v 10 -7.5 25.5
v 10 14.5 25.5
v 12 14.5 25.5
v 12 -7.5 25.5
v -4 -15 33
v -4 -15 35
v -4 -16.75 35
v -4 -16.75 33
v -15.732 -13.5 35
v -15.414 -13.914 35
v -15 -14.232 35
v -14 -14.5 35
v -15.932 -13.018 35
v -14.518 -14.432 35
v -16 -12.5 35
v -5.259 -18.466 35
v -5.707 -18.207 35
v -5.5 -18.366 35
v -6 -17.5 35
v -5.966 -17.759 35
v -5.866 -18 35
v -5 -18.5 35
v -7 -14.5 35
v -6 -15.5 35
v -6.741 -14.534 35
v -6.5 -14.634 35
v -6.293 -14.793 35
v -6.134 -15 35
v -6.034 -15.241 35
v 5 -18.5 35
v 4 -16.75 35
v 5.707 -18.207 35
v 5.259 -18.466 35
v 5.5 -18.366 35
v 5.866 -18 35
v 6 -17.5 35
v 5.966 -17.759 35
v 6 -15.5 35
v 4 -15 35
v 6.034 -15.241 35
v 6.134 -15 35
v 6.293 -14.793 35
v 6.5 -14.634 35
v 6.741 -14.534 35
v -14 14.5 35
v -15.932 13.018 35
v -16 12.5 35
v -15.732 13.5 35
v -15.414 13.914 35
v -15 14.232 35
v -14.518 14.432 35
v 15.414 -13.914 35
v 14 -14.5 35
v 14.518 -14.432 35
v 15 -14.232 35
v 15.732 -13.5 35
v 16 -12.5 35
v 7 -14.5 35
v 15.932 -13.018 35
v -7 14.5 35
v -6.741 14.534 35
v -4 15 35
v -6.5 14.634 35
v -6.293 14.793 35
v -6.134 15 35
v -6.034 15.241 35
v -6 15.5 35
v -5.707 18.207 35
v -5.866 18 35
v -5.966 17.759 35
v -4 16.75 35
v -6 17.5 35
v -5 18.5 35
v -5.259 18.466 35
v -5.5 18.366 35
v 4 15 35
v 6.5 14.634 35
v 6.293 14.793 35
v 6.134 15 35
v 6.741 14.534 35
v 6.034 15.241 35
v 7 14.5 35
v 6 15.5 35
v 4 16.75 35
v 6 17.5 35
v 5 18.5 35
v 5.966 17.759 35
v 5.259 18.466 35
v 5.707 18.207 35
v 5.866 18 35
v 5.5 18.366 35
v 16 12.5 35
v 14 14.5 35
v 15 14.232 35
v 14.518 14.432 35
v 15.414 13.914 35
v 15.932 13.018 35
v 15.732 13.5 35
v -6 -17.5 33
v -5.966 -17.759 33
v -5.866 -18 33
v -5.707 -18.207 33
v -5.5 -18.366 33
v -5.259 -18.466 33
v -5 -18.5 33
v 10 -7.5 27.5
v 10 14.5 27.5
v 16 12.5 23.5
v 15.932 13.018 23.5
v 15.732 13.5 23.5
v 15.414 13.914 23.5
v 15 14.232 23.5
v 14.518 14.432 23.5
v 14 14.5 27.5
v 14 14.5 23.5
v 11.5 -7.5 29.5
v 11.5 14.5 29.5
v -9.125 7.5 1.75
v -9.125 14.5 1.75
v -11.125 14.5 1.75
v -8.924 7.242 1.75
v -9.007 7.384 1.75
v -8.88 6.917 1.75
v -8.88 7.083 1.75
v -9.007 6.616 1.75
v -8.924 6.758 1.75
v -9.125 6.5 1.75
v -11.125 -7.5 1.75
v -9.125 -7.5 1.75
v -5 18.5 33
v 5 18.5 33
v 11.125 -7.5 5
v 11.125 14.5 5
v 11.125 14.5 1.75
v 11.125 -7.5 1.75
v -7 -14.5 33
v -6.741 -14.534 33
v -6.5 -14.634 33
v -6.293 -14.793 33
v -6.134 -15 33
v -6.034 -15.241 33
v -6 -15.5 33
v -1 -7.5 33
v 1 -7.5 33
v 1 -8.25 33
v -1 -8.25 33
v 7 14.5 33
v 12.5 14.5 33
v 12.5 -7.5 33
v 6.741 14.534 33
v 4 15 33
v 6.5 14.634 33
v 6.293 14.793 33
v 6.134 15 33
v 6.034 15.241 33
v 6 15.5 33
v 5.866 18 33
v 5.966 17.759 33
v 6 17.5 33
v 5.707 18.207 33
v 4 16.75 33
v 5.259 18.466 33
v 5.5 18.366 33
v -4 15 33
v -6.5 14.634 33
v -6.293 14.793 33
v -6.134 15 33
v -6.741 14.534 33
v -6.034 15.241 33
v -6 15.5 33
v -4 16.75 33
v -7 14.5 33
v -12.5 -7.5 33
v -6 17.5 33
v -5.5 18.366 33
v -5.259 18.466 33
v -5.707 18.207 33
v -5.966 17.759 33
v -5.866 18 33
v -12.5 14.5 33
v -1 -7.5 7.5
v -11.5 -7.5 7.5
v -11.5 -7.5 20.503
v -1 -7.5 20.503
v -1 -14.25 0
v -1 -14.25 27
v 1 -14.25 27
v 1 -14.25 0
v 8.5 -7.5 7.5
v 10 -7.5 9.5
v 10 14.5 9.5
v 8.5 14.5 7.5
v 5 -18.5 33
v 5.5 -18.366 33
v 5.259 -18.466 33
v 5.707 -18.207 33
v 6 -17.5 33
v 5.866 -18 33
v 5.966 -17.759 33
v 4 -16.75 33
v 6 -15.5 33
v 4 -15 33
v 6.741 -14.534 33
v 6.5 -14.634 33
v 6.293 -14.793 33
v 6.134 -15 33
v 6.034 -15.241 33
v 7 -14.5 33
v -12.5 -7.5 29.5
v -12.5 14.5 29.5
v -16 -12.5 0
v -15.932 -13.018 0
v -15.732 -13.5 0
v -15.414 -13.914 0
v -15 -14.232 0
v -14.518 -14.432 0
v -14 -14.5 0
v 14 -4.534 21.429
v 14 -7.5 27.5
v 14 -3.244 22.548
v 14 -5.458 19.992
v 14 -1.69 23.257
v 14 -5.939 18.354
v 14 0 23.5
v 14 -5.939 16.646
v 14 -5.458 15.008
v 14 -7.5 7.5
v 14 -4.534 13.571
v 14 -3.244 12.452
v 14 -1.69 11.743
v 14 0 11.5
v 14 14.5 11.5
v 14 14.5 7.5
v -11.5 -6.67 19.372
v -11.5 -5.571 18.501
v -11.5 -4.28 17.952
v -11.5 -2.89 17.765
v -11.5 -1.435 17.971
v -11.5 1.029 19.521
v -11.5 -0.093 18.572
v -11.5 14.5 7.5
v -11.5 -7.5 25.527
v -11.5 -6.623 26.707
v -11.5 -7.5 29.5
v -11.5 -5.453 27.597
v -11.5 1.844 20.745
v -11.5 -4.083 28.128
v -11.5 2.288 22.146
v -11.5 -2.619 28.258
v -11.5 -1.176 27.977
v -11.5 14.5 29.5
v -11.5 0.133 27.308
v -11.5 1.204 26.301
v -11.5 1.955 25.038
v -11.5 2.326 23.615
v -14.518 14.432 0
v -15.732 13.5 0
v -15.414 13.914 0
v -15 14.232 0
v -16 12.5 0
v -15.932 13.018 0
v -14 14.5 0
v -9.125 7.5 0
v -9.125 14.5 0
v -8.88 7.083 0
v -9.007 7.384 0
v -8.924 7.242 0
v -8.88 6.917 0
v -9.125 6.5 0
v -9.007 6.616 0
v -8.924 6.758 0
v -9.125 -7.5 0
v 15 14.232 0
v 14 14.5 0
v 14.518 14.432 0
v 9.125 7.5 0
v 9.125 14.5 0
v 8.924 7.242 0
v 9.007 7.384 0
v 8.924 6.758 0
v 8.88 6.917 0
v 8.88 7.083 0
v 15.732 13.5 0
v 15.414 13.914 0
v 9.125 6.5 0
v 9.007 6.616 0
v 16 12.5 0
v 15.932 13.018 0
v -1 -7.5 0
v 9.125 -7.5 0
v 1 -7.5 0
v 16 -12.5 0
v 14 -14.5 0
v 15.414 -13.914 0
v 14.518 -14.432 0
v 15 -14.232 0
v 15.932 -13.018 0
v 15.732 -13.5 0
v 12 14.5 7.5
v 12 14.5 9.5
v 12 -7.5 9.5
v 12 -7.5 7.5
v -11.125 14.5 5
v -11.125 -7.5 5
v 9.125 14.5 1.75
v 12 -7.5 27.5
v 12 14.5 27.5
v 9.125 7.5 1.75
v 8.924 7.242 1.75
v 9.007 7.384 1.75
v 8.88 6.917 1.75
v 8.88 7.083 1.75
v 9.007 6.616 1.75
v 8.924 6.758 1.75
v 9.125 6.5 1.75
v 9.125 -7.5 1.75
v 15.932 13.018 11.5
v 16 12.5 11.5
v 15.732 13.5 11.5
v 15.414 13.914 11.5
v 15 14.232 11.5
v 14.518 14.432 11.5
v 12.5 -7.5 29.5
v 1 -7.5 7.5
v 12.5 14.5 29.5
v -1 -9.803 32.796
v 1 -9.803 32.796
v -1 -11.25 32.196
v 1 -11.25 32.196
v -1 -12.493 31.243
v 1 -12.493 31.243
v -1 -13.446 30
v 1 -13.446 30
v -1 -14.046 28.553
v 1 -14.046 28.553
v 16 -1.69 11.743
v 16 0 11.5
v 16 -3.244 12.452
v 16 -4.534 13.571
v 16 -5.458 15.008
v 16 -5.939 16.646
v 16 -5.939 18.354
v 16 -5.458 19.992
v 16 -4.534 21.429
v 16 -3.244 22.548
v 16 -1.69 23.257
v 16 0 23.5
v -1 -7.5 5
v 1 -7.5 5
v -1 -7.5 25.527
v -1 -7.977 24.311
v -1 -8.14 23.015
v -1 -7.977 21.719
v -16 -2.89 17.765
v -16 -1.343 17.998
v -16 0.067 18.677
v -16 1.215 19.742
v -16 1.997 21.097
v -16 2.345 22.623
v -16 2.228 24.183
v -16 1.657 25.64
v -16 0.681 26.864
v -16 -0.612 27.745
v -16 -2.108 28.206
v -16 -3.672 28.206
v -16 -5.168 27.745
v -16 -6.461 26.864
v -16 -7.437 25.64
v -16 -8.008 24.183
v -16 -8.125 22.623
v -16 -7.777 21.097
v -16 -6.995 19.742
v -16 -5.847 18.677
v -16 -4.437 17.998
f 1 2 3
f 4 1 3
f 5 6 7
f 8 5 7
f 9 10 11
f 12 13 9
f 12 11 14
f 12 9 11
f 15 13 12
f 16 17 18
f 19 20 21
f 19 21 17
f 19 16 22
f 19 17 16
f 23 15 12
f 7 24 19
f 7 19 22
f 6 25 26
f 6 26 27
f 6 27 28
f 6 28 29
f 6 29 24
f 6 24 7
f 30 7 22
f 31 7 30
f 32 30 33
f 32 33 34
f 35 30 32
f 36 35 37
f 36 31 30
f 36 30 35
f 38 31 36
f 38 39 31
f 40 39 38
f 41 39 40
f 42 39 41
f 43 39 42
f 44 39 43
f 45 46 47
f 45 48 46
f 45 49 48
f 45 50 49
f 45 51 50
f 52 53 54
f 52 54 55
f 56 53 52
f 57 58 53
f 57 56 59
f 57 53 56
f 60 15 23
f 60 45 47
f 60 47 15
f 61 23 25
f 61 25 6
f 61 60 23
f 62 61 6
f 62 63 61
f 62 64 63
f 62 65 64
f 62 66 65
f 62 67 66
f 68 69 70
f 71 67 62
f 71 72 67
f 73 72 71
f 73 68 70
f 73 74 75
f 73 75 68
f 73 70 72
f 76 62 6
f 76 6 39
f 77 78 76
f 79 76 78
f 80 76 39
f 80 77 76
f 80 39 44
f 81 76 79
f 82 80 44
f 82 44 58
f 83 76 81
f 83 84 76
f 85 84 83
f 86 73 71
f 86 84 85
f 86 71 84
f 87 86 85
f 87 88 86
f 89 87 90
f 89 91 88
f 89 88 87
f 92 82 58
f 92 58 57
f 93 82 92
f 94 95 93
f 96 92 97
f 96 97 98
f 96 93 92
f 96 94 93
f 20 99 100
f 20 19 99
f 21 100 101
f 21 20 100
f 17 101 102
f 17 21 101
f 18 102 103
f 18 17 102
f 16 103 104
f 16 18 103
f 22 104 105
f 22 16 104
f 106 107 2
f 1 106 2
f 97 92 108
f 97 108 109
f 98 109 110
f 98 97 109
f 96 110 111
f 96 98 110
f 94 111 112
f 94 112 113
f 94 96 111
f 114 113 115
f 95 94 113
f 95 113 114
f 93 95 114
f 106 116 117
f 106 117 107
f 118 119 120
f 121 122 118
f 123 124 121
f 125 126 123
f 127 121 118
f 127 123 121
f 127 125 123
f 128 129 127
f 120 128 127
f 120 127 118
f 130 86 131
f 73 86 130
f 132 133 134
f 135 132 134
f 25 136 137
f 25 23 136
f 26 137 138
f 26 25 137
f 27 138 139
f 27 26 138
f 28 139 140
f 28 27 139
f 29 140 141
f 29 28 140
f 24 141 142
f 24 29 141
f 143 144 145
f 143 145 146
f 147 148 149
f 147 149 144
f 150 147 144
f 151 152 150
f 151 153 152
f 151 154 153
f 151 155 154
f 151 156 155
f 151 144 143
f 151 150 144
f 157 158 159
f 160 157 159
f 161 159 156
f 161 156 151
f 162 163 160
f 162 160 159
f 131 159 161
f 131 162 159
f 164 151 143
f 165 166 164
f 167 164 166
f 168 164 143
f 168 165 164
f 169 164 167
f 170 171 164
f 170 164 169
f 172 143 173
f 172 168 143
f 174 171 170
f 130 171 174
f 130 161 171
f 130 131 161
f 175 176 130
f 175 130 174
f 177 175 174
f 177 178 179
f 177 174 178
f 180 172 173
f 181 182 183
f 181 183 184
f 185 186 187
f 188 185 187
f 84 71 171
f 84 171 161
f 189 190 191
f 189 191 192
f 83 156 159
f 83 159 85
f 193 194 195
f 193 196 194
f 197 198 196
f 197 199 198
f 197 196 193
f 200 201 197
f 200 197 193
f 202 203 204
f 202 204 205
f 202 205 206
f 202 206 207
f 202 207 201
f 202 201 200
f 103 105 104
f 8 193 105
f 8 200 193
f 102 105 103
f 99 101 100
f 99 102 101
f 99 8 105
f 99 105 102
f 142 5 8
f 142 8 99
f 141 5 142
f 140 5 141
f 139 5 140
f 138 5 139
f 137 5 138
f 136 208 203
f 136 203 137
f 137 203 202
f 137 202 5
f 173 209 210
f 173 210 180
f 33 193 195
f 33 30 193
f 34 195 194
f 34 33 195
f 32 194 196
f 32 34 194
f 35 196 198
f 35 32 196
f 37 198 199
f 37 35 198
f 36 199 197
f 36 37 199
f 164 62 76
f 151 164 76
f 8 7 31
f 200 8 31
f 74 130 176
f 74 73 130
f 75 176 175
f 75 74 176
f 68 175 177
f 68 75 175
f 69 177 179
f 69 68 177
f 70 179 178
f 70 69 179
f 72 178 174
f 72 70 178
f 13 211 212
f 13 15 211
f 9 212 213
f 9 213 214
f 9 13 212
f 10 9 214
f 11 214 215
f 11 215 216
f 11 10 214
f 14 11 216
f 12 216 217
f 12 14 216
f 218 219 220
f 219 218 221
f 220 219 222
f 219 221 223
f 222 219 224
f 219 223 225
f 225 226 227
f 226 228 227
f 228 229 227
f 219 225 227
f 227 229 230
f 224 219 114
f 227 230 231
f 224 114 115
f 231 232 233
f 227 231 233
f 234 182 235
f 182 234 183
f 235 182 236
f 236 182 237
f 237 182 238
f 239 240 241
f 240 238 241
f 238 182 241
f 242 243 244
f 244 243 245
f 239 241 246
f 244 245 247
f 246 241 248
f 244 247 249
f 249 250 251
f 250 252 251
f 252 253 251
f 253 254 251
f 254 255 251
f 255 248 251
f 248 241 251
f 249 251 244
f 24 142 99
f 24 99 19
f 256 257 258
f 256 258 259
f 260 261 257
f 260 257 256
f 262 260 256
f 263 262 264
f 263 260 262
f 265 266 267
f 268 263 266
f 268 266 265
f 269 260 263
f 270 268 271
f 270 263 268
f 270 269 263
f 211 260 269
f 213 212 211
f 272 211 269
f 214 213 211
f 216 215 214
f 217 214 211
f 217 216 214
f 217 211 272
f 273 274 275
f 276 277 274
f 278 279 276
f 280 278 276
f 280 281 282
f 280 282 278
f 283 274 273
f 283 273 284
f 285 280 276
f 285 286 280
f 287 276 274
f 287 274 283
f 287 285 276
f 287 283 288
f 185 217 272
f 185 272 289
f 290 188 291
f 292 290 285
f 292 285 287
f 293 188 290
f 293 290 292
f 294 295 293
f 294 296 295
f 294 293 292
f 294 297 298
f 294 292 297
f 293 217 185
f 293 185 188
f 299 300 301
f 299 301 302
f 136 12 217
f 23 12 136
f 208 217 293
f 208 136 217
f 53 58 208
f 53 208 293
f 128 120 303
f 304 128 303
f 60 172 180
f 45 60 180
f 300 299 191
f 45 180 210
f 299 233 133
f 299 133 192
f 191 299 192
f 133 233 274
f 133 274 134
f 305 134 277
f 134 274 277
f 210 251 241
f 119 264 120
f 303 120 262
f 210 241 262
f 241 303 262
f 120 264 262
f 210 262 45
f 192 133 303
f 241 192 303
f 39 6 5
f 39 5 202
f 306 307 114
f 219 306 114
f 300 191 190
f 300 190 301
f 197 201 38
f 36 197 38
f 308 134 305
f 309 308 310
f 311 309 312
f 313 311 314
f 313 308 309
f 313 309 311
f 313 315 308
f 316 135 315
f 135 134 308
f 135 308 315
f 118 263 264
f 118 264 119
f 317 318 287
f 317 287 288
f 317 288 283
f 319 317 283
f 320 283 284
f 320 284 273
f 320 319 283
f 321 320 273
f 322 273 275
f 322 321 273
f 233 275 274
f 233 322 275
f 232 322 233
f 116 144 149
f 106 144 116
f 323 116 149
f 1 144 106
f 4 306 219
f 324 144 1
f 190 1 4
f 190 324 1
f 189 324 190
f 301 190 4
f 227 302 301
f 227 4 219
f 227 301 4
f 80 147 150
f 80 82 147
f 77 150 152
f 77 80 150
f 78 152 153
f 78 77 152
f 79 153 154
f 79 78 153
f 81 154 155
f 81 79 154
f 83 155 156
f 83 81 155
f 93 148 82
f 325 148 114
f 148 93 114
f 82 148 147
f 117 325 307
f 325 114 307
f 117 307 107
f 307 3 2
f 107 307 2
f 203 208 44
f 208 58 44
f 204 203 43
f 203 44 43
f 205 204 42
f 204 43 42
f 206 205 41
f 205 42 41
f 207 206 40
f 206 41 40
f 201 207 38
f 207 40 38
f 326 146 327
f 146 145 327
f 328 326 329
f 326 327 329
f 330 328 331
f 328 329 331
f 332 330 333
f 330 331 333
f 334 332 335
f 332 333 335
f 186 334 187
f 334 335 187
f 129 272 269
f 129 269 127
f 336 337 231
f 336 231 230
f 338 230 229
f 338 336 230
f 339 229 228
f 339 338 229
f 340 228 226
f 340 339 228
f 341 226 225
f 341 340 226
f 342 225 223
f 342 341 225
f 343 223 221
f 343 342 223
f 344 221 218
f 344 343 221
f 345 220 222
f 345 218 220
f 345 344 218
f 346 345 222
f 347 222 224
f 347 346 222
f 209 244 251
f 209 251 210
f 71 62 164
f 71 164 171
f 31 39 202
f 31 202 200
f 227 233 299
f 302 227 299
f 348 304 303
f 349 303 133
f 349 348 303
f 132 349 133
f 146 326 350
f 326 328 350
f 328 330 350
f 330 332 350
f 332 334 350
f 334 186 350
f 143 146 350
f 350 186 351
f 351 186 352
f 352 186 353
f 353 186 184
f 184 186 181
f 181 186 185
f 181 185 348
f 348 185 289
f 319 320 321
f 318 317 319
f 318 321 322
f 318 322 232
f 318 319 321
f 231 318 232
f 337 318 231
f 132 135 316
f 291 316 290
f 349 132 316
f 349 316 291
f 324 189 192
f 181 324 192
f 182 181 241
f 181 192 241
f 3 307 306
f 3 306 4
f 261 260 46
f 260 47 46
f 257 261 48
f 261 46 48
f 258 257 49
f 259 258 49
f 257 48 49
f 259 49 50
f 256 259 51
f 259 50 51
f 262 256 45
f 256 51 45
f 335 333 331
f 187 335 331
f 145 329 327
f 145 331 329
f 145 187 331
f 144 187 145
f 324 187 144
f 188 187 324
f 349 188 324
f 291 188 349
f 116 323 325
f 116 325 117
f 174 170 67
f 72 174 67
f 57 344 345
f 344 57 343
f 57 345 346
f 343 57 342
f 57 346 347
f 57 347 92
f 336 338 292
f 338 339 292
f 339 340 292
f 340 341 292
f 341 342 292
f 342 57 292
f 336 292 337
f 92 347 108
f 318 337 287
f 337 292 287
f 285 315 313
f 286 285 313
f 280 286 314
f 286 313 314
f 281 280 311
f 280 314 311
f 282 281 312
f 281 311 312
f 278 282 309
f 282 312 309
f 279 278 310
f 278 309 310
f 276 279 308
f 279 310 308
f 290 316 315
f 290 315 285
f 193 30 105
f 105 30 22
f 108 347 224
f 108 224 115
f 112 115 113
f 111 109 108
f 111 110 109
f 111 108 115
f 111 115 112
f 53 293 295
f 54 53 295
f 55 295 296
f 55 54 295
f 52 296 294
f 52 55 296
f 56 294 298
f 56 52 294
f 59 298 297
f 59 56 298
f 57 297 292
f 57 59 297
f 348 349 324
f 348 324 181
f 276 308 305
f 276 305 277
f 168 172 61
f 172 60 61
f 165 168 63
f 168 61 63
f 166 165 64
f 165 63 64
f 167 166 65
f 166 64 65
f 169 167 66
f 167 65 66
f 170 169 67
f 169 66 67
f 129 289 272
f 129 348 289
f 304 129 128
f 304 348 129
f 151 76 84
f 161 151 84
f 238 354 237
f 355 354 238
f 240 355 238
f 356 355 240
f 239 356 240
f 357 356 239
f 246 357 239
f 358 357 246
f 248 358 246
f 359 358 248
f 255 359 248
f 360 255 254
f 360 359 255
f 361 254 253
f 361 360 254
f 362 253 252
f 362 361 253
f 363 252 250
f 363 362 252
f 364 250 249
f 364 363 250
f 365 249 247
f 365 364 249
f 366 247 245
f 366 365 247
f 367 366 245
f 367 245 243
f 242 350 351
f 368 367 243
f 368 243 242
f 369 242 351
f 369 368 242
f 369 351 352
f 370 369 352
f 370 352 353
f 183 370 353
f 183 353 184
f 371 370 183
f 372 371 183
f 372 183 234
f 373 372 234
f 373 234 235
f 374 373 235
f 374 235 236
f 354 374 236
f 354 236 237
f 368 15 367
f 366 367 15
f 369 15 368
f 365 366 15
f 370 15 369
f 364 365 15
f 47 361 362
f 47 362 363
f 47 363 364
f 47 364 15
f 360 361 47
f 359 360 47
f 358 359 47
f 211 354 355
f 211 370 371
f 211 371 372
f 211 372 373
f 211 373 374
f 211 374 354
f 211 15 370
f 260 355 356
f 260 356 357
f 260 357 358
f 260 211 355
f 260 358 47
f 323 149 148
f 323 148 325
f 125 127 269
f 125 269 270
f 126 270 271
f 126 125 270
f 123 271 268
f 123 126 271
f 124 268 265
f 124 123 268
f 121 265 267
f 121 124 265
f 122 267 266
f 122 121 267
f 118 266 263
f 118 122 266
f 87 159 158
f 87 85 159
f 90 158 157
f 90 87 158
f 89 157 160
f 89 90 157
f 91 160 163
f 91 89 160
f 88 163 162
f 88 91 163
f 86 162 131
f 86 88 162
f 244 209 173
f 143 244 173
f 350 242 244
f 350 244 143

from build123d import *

# Parameters (mm, degrees)
SKETCH1_W                         = 32
SKETCH1_H                         = 29
BOSS_EXTRUDE1_DEPTH               = 35
FILLET1_R                         = 2
SLOT_FOR_COIL_DEPTH               = 1
SLOT_FOR_COIL_DEPTH_BACK          = 30
BOSS_EXTRUDE2_DEPTH               = 7
BOSS_EXTRUDE3_DEPTH               = 1.75
SKETCH5_W                         = 2
SKETCH5_H                         = 7
SLOT_TO_FEED_IN_WIRE_DEPTH        = 33
SLOT_FO_PCB_DEPTH                 = 22
SKETCH7_W                         = 2
SKETCH7_H                         = 33
BOSS_EXTRUDE4_DEPTH               = 0.25
FILLET2_R                         = 6
ROD_MOUNT_SLOT_REACH              = 34
SKETCH14_W                        = 2.5
SKETCH14_H                        = 20
SIDE_CAVITY_FOR_MOUNT_PLATE_DEPTH = 22
SKETCH16_W                        = 2
SKETCH16_H                        = 2
SIDE_STOPS_FOR_MOUNT_PLATE_DEPTH  = 22
BOSS_EXTRUDE6_DEPTH               = 22
SKETCH21_W                        = 12
SKETCH21_H                        = 2
BOSS_EXTRUDE7_DEPTH               = 4
SKETCH23_W                        = 8
SKETCH23_H                        = 1.75
CUT_EXTRUDE7_DEPTH                = 2
FILLET3_R                         = 1
CUT_EXTRUDE8_REACH                = 34
SKETCH26_R                        = 5.25


with BuildPart() as part:
    # Sketch1 → Boss-Extrude1 (new body)
    with BuildSketch(Plane.XY):
        Rectangle(SKETCH1_W, SKETCH1_H)
    extrude(amount=BOSS_EXTRUDE1_DEPTH)

    # Fillet1
    fillet1_edges = [part.edges().sort_by_distance(p)[0] for p in [
        (16, -14.5, 17.5),
        (-16, -14.5, 17.5),
        (-16, 14.5, 17.5),
        (16, 14.5, 17.5),
    ]]
    fillet(fillet1_edges, radius=FILLET1_R)

    # Sketch2 → Slot for Coil (cut, two sides)
    with BuildSketch(Plane.XZ.offset(14.5)) as slot_for_coil_sk:
        Polygon((-9.125, 0), (-9.125, 1.75), (-11.125, 1.75), (-11.125, 5), (11.125, 5), (11.125, 1.75), (9.125, 1.75), (9.125, 0), align=None)
    extrude(amount=SLOT_FOR_COIL_DEPTH, mode=Mode.SUBTRACT)
    extrude(slot_for_coil_sk.sketch, amount=-SLOT_FOR_COIL_DEPTH_BACK, mode=Mode.SUBTRACT)

    # Sketch3 → Boss-Extrude2 (add)
    with BuildSketch(Plane.XZ.offset(14.5)):
        Polygon((-9.125, 0), (-9.125, 1.75), (-11.125, 1.75), (-11.125, 5), (11.125, 5), (11.125, 1.75), (9.125, 1.75), (9.125, 0), align=None)
    extrude(amount=-BOSS_EXTRUDE2_DEPTH)

    # Sketch4 → Boss-Extrude3 (add)
    with BuildSketch(Plane(origin=(0, 0, 1.75), x_dir=(-1, 0, 0), z_dir=(0, 0, -1))):
        with BuildLine():
            Line((-9.125, 7.5), (-9.125, 6.5))
            ThreePointArc((-9.125, 6.5), (-8.875, 7), (-9.125, 7.5))
        make_face()
    boss_extrude3 = extrude(amount=BOSS_EXTRUDE3_DEPTH)

    # Mirror1: Boss-Extrude3 across plane
    add(boss_extrude3.mirror(Plane(origin=(0, 0, 0), x_dir=(0, 0, 1), z_dir=(1, 0, 0))))

    # Sketch5 → slot to feed in wire (cut)
    with BuildSketch(Plane(origin=(0, 0, 0), x_dir=(-1, 0, 0), z_dir=(0, 0, -1))):
        with Locations((0, -11)):
            Rectangle(SKETCH5_W, SKETCH5_H)
    extrude(amount=-SLOT_TO_FEED_IN_WIRE_DEPTH, mode=Mode.SUBTRACT)

    # Sketch6 → slot fo PCB (cut)
    with BuildSketch(Plane(origin=(0, 14.5, 0), x_dir=(1, 0, 0), z_dir=(0, 1, 0))):
        Polygon((11.5, -7.5), (-11.5, -7.5), (-11.5, -29.5), (-12.5, -29.5), (-12.5, -33), (12.5, -33), (12.5, -29.5), (11.5, -29.5), align=None)
    extrude(amount=-SLOT_FO_PCB_DEPTH, mode=Mode.SUBTRACT)

    # Sketch7 → Boss-Extrude4 (add)
    with BuildSketch(Plane.XZ.offset(14.5)):
        with Locations((0, 16.5)):
            Rectangle(SKETCH7_W, SKETCH7_H)
    extrude(amount=-BOSS_EXTRUDE4_DEPTH)

    # Fillet2
    fillet2_edges = [part.edges().sort_by_distance(p)[0] for p in [
        (0, -14.25, 33),
    ]]
    fillet(fillet2_edges, radius=FILLET2_R)

    # Sketch11 → Rod Mount Slot (cut, up to next)
    with BuildSketch(Plane(origin=(16, 0, 44), x_dir=(0, 0, -1), z_dir=(1, 0, 0)), mode=Mode.PRIVATE) as rod_mount_slot_sk1:
        with BuildLine():
            Line((32.5, 25), (32.5, 0))
            ThreePointArc((32.5, 0), (26.5, -6), (20.5, 0))
            Line((20.5, 0), (20.5, 25))
            ThreePointArc((20.5, 25), (26.5, 31), (32.5, 25))
        make_face()
    rod_mount_slot_tool1 = extrude(rod_mount_slot_sk1.sketch, amount=-ROD_MOUNT_SLOT_REACH, mode=Mode.PRIVATE) & part.part
    add(rod_mount_slot_tool1.solids().sort_by_distance((16, 12.5, 17.5))[0], mode=Mode.SUBTRACT)

    # Sketch14 → Side cavity for mount plate (cut)
    with BuildSketch(Plane(origin=(0, 14.5, 0), x_dir=(1, 0, 0), z_dir=(0, 1, 0))):
        with Locations((12.75, -17.5)):
            Rectangle(SKETCH14_W, SKETCH14_H)
    extrude(amount=-SIDE_CAVITY_FOR_MOUNT_PLATE_DEPTH, mode=Mode.SUBTRACT)

    # Sketch16 → Side stops for mount plate (add)
    with BuildSketch(Plane(origin=(0, 14.5, 0), x_dir=(1, 0, 0), z_dir=(0, 1, 0))):
        with Locations((11, -8.5)):
            Rectangle(SKETCH16_W, SKETCH16_H)
        with Locations((11, -26.5)):
            Rectangle(SKETCH16_W, SKETCH16_H)
    extrude(amount=-SIDE_STOPS_FOR_MOUNT_PLATE_DEPTH)

    # Sketch20 → Boss-Extrude6 (add)
    with BuildSketch(Plane(origin=(0, 14.5, 0), x_dir=(1, 0, 0), z_dir=(0, 1, 0))):
        Polygon((11.5, -29.5), (10, -27.5), (11.5, -27.5), align=None)
        Polygon((10, -9.5), (8.5, -7.5), (10, -7.5), align=None)
    extrude(amount=-BOSS_EXTRUDE6_DEPTH)

    # Sketch21 → Boss-Extrude7 (add)
    with BuildSketch(Plane(origin=(0, 14.5, 0), x_dir=(-1, 0, 0), z_dir=(0, 1, 0))):
        with Locations((0, 34)):
            Rectangle(SKETCH21_W, SKETCH21_H)
    boss_extrude7 = extrude(amount=BOSS_EXTRUDE7_DEPTH)

    # Sketch23 → Cut-Extrude7 (cut)
    with BuildSketch(Plane.XY.offset(35)):
        with Locations((0, 15.875)):
            Rectangle(SKETCH23_W, SKETCH23_H)
    cut_extrude7 = extrude(amount=-CUT_EXTRUDE7_DEPTH, mode=Mode.SUBTRACT)

    # Mirror3: Boss-Extrude7, Cut-Extrude7 across plane
    add(boss_extrude7.mirror(Plane.ZX))
    add(cut_extrude7.mirror(Plane.ZX), mode=Mode.SUBTRACT)

    # Fillet3
    fillet3_edges = [part.edges().sort_by_distance(p)[0] for p in [
        (6, 14.5, 34),
        (-6, 14.5, 34),
        (6, 18.5, 34),
        (-6, 18.5, 34),
        (6, -18.5, 34),
        (-6, -18.5, 34),
        (6, -14.5, 34),
        (-6, -14.5, 34),
    ]]
    fillet(fillet3_edges, radius=FILLET3_R)

    # Sketch26 → Cut-Extrude8 (cut, up to next)
    with BuildSketch(Plane(origin=(-16, 0, 0), x_dir=(0, 0, -1), z_dir=(1, 0, 0)), mode=Mode.PRIVATE) as cut_extrude8_sk1:
        with Locations((-23.015, -2.89)):
            Circle(SKETCH26_R)
    cut_extrude8_tool1 = extrude(cut_extrude8_sk1.sketch, amount=CUT_EXTRUDE8_REACH, mode=Mode.PRIVATE) & part.part
    add(cut_extrude8_tool1.solids().sort_by_distance((-16, -2.89, 23.015))[0], mode=Mode.SUBTRACT)


solid = part.part
